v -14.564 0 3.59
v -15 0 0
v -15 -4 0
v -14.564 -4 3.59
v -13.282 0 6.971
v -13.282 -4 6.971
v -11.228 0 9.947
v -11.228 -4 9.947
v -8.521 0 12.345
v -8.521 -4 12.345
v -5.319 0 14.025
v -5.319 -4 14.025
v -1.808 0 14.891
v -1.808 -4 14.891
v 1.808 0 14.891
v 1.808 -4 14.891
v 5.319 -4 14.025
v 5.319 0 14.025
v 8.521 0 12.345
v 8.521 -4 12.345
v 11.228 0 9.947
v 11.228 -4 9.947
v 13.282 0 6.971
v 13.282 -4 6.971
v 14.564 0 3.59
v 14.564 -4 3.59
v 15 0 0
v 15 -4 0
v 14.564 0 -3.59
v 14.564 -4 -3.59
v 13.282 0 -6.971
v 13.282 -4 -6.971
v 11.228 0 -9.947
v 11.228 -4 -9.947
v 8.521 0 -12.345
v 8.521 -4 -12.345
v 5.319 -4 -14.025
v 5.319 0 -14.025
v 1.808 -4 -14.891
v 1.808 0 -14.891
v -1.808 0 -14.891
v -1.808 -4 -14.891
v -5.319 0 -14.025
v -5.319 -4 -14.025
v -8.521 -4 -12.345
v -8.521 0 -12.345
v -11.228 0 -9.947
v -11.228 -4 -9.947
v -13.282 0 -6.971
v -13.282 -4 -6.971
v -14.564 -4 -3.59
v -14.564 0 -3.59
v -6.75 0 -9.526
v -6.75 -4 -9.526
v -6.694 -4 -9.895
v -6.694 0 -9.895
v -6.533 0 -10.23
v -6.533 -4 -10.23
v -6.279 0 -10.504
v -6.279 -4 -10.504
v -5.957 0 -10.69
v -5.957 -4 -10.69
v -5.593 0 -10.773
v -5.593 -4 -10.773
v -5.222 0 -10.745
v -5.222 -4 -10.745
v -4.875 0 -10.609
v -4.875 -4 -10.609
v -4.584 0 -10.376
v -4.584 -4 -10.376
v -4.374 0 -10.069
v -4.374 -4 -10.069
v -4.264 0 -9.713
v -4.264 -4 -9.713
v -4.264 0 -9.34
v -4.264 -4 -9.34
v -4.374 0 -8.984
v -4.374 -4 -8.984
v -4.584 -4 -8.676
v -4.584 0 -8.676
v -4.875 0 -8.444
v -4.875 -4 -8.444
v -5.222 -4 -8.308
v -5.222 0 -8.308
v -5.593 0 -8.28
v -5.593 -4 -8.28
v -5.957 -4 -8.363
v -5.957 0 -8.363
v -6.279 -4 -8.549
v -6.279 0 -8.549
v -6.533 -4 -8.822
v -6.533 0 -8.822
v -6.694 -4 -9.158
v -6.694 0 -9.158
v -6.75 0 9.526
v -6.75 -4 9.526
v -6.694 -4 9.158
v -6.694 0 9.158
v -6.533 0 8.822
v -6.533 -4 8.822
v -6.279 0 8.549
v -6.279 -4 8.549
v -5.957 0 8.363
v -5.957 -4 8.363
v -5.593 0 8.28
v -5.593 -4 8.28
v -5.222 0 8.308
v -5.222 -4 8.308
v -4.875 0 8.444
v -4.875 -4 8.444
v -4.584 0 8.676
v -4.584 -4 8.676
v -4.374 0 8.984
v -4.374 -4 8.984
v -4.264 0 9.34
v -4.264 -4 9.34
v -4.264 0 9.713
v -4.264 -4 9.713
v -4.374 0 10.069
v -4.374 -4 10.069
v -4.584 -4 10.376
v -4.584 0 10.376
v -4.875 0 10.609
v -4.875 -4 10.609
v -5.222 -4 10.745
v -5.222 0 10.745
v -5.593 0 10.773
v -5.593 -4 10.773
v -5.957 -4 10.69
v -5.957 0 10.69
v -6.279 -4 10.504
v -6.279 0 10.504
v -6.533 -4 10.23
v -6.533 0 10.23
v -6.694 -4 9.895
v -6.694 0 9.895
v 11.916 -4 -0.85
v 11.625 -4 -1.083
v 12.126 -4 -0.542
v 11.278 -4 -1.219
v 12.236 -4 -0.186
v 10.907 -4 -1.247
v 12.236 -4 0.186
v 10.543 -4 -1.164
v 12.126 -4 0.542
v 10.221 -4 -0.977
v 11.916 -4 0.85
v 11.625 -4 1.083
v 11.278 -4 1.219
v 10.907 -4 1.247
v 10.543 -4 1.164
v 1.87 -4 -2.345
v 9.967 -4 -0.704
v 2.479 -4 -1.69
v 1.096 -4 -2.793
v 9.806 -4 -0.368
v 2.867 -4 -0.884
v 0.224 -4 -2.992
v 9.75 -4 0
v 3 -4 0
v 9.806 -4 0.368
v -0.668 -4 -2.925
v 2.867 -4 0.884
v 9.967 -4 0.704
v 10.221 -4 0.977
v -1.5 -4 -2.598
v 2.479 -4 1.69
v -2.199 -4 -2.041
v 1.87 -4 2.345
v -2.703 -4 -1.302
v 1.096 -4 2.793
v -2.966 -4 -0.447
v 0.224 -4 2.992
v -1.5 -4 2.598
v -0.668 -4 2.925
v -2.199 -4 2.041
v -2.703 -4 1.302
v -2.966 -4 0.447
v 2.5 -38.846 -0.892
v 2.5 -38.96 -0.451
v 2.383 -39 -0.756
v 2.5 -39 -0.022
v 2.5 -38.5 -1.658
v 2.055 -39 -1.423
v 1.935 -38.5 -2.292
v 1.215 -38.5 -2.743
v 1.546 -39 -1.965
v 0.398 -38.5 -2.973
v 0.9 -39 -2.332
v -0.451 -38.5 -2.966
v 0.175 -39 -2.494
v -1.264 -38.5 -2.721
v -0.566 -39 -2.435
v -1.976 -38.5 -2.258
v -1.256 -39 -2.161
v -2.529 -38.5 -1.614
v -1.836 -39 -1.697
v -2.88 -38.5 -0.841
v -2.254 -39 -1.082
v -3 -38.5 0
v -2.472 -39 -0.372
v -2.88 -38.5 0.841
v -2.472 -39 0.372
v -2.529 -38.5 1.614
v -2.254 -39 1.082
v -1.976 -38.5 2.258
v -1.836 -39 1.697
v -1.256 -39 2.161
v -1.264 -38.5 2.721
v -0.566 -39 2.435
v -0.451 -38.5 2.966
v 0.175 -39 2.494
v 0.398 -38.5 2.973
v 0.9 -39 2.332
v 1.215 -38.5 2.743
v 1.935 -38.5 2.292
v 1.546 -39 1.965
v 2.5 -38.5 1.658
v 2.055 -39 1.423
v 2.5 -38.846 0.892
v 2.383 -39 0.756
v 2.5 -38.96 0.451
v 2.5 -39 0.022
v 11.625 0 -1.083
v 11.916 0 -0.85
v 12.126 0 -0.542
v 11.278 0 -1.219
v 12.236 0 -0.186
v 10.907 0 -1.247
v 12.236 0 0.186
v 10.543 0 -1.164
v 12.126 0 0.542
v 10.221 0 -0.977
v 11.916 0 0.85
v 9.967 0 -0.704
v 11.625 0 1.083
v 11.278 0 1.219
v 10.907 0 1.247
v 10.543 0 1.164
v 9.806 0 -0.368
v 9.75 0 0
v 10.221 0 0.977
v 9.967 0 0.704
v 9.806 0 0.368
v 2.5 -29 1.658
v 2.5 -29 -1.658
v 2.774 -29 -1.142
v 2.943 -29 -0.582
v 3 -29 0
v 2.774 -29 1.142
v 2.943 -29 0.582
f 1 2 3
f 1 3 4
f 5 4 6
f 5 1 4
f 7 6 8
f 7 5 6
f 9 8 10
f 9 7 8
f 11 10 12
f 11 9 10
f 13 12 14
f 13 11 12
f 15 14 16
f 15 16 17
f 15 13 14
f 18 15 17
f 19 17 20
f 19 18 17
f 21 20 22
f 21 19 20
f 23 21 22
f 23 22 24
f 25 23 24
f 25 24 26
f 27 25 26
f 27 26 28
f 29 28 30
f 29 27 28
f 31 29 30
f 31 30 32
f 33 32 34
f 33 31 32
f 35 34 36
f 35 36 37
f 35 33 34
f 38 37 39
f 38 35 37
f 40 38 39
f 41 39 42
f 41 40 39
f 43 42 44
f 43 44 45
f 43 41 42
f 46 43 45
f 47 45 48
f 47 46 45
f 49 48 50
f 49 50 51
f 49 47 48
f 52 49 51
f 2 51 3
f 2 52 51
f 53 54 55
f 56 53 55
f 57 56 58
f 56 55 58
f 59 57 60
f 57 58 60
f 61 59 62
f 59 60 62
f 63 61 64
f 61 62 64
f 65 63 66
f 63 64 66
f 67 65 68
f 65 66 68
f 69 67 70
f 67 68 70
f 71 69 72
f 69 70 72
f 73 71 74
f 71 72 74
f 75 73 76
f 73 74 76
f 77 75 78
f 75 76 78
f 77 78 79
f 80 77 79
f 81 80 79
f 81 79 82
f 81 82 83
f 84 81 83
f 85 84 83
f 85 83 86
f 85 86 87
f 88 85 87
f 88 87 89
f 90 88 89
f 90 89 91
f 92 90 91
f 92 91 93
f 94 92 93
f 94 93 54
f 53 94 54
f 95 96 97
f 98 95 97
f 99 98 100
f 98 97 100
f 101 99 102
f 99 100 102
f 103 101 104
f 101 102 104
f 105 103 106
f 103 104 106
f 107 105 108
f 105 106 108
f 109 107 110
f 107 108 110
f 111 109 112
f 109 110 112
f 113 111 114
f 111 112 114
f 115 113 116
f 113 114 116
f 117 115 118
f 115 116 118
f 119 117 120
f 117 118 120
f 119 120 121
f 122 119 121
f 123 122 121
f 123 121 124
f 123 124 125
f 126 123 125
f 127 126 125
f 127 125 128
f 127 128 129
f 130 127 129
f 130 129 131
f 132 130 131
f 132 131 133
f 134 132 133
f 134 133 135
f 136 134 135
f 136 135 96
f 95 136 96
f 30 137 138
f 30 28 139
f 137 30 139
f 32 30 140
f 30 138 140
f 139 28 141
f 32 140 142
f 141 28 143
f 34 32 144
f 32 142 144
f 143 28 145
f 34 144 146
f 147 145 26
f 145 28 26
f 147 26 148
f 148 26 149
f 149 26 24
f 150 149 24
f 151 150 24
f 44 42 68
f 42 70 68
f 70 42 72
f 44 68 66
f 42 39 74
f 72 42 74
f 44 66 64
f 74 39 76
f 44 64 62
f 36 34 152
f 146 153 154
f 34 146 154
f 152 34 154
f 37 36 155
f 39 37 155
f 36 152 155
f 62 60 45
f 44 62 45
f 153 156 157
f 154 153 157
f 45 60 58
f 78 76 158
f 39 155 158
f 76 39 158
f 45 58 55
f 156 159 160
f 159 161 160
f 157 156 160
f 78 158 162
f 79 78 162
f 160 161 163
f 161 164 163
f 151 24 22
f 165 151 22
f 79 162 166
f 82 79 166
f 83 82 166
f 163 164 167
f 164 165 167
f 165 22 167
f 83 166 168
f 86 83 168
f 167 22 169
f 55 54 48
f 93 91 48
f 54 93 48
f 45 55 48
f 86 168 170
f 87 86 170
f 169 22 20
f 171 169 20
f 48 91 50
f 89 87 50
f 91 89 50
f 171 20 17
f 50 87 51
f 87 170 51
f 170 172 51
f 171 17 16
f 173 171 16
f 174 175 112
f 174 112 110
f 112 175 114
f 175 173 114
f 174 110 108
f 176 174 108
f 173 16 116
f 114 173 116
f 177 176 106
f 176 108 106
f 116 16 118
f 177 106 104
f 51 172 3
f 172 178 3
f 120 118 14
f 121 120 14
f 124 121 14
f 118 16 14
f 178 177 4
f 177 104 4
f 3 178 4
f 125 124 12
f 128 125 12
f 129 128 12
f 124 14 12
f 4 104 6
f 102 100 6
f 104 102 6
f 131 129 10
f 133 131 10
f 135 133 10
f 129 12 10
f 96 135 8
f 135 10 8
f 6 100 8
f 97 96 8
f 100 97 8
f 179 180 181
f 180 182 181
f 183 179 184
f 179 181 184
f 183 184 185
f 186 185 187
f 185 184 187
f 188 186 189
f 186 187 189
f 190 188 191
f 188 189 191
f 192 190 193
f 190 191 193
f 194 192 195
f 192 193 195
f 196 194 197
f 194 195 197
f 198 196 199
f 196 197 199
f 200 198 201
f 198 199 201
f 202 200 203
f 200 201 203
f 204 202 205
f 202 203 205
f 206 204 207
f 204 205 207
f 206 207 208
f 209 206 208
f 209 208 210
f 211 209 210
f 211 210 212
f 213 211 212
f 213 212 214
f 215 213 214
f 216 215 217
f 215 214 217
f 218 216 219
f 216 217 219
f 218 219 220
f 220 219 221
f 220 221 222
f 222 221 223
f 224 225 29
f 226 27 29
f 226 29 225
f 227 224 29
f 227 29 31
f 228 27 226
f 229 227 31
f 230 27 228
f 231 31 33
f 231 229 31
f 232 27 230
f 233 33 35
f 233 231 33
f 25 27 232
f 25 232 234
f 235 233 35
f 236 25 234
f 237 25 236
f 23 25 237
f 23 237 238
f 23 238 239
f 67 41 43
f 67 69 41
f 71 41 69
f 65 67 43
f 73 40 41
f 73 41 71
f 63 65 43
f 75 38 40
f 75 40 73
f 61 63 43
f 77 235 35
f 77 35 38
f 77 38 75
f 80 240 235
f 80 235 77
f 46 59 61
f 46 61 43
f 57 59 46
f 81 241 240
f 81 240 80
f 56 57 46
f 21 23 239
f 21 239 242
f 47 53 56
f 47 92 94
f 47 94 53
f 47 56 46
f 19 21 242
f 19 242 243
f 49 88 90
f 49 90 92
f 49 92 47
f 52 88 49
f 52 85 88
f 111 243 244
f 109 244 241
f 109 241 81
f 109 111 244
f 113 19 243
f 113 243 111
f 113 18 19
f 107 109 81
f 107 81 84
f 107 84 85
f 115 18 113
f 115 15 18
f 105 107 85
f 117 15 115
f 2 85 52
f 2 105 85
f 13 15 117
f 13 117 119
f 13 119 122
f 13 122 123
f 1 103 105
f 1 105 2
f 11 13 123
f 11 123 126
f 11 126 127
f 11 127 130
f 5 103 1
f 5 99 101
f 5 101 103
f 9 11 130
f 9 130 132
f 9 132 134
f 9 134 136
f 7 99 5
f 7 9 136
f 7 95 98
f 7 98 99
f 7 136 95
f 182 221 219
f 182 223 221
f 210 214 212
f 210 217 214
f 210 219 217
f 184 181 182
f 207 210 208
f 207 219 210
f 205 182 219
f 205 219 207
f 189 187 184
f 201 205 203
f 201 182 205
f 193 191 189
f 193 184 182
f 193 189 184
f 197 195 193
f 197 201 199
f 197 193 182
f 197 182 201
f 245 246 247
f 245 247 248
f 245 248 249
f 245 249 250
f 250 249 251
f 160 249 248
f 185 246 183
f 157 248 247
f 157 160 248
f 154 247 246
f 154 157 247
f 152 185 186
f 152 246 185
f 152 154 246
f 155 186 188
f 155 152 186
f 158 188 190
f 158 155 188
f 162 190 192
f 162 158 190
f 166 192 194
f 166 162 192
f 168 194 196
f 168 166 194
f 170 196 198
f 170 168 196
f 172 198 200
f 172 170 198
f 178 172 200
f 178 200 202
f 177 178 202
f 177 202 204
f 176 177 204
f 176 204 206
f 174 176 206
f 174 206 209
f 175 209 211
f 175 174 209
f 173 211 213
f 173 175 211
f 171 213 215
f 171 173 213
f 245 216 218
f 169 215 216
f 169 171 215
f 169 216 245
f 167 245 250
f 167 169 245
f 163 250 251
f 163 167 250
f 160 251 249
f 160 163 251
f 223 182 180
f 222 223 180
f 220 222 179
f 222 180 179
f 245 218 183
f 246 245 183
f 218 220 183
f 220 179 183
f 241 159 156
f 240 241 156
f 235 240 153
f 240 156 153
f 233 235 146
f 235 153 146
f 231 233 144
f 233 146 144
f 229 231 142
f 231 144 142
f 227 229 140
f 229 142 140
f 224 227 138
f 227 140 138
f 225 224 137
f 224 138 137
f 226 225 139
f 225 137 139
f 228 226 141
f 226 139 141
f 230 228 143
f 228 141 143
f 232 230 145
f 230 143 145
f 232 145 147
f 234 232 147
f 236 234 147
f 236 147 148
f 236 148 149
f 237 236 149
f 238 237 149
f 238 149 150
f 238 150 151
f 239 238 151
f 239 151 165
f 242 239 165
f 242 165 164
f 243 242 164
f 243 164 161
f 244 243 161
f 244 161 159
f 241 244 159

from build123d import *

# Parameters (mm, degrees)
CROQUIS1_W                                 = 3
CROQUIS1_H                                 = 39
CORTAR_EXTRUIR1_DEPTH                      = 10
CROQUIS4_R                                 = 15
SALIENTE_EXTRUIR1_DEPTH                    = 4
PERFORADOR_PARA_ROSCAR_PARA_MACHO_DE_ROS_D = 2.5
CHAFL_N1_SIZE                              = 0.5


with BuildPart() as part:
    # Croquis1 → Revolución1 (revolve)
    with BuildSketch(Plane.XY):
        with Locations((1.5, -19.5)):
            Rectangle(CROQUIS1_W, CROQUIS1_H)
    revolve(axis=Axis((0, -39, 0), (0, 1, 0)))

    # Croquis2 → Cortar-Extruir1 (cut)
    with BuildSketch(Plane.XZ.offset(39)):
        with BuildLine():
            Line((2.5, 1.658312395), (2.5, -1.658312395))
            ThreePointArc((2.5, -1.658312395), (3, 0), (2.5, 1.658312395))
        make_face()
    extrude(amount=-CORTAR_EXTRUIR1_DEPTH, mode=Mode.SUBTRACT)

    # Croquis4 → Saliente-Extruir1 (add)
    with BuildSketch(Plane(origin=(0, 0, 0), x_dir=(1, 0, 0), z_dir=(0, 1, 0))):
        with Locations(Location((0, 0, 0), (0, 0, 180))):
            Circle(CROQUIS4_R)
    extrude(amount=-SALIENTE_EXTRUIR1_DEPTH)

    # Perforador para roscar para macho de roscar para M3x0.51 (through all)
    with Locations(Plane(origin=(0, 0, 0), x_dir=(1, 0, 0), z_dir=(0, 1, 0))):
        with Locations((11, 0), (-5.5, -9.526279442), (-5.5, 9.526279442)):
            Hole(PERFORADOR_PARA_ROSCAR_PARA_MACHO_DE_ROS_D / 2)

    # Chaflán1
    chafl_n1_edges = [part.edges().sort_by_distance(p)[0] for p in [
        (-3, -39, 0),
    ]]
    chamfer(chafl_n1_edges, length=CHAFL_N1_SIZE - 0.0001)  # a hair under: the kernel refuses the full size


solid = part.part
